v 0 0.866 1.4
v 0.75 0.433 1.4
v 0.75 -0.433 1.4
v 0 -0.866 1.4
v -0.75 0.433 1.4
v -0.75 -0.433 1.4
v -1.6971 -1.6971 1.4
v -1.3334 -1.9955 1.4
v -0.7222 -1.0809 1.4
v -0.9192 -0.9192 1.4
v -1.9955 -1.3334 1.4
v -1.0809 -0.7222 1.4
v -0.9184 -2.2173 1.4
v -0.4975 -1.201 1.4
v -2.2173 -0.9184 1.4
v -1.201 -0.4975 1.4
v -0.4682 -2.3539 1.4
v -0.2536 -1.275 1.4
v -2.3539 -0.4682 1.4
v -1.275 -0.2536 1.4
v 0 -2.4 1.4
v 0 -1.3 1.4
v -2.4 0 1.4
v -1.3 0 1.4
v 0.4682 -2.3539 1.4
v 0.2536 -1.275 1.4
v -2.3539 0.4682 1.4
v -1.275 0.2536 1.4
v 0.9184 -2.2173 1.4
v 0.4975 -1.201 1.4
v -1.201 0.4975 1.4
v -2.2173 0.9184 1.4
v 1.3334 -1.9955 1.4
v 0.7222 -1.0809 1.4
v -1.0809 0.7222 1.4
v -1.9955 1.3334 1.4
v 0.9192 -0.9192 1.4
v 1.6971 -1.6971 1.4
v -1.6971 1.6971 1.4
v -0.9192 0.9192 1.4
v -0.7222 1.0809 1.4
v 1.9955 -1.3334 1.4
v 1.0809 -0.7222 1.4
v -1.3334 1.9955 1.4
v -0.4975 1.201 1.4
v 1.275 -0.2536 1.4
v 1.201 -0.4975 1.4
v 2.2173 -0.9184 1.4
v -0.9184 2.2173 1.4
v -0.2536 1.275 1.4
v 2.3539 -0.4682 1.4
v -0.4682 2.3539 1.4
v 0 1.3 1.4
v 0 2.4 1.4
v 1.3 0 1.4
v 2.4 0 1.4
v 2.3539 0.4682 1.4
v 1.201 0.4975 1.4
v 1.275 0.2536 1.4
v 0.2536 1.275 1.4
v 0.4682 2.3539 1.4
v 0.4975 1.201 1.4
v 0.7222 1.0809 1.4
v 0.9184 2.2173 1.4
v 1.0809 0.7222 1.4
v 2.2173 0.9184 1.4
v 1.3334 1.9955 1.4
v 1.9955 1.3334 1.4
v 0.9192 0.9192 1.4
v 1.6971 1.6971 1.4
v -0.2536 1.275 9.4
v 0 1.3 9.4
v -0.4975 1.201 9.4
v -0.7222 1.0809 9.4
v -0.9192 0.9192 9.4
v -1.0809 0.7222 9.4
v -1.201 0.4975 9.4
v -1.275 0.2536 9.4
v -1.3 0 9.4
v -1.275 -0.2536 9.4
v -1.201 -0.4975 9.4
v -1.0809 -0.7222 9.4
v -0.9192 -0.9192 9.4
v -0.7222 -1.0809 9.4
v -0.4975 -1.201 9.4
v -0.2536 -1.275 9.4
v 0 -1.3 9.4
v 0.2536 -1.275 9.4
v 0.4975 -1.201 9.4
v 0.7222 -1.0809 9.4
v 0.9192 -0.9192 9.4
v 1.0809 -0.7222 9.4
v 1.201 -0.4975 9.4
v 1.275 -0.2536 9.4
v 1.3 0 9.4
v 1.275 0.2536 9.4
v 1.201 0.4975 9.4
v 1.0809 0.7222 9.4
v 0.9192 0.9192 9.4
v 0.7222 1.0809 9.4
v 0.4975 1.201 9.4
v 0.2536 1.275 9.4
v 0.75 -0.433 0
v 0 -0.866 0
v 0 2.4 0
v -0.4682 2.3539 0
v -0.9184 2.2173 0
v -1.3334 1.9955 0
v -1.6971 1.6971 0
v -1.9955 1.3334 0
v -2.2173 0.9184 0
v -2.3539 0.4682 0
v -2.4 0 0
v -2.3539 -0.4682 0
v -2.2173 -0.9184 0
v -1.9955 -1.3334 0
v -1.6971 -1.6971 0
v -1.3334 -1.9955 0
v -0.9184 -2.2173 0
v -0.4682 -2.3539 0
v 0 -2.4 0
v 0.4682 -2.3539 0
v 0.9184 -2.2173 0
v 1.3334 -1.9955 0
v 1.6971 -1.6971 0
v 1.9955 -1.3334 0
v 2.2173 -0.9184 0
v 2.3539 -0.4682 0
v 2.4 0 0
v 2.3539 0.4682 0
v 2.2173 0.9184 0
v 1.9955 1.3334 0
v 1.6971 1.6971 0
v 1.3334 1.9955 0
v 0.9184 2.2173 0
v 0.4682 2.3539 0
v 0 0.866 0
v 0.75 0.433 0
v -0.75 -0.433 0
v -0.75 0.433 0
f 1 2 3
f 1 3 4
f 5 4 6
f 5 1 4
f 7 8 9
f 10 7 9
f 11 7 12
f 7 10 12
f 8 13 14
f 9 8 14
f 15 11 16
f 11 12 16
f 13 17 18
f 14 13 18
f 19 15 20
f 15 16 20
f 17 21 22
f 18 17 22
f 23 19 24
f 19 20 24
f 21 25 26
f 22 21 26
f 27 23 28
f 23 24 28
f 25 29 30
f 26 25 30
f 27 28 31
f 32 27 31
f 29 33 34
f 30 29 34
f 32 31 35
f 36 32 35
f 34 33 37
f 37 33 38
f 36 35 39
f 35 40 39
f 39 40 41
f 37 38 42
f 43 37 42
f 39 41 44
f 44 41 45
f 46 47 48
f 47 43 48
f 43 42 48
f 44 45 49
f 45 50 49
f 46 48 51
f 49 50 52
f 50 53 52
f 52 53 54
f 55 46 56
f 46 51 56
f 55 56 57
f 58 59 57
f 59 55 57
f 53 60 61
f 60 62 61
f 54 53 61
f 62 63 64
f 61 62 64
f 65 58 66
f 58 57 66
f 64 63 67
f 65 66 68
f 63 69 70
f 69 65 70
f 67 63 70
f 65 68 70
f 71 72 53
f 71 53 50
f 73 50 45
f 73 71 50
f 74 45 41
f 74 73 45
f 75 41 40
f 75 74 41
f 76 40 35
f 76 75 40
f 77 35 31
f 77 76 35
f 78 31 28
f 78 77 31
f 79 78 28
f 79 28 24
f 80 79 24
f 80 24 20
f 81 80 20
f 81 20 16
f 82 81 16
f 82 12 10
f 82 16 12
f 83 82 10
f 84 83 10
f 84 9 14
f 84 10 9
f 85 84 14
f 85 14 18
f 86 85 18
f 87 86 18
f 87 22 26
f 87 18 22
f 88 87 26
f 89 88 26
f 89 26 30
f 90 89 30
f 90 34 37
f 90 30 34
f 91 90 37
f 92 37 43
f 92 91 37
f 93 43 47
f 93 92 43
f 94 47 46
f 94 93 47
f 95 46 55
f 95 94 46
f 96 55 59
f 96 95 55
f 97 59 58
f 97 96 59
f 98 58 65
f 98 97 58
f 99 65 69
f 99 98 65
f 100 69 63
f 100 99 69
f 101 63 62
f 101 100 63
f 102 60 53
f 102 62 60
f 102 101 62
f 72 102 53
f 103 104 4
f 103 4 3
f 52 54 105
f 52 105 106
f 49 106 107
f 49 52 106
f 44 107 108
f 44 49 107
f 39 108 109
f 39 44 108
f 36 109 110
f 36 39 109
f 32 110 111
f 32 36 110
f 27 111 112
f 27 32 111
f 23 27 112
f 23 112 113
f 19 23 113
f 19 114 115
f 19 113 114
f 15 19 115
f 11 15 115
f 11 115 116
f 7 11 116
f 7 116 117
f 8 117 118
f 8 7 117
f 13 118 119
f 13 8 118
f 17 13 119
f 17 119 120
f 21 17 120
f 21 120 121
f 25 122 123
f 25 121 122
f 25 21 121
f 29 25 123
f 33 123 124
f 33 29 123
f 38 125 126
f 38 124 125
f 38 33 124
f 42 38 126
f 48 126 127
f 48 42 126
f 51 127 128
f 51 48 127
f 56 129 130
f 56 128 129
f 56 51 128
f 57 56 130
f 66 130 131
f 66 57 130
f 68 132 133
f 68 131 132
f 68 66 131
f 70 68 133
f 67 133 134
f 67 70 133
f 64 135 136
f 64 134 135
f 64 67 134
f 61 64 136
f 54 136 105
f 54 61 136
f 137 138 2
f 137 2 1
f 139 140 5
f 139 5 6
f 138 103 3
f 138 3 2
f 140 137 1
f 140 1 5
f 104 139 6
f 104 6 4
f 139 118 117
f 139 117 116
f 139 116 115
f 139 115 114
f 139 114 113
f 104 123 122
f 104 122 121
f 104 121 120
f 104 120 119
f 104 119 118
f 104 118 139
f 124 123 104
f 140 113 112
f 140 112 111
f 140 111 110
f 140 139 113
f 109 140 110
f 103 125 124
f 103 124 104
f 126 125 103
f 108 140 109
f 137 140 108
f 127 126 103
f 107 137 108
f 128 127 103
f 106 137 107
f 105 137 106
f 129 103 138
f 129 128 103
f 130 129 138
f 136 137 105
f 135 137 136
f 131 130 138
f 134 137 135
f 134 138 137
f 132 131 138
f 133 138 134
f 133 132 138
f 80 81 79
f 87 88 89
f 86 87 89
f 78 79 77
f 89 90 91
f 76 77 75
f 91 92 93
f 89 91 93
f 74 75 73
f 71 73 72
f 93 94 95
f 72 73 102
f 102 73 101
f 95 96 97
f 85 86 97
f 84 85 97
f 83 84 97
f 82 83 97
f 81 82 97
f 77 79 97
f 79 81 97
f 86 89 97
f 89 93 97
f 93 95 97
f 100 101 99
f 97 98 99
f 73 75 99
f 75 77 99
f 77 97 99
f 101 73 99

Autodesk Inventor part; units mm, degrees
ref_plane "YZ Plane" through (0, 0, 0) normal (1, 0, 0) x (0, 1, 0)
ref_plane "XZ Plane" through (0, 0, 0) normal (0, 1, 0) x (-1, 0, 0)
ref_plane "XY Plane" through (0, 0, 0) normal (0, 0, 1) x (1, 0, 0)
sketch "スケッチ1" plane through (0, 0, 0) normal (1, 0, 0) x (0, 1, 0)
  line L0 (0, 9.4) -> (0, 0)
  line L1 (0, 0) -> (2.4, 0)
  line L2 (2.4, 0) -> (2.4, 1.4)
  line L3 (2.4, 1.4) -> (1.3, 1.4)
  line L4 (1.3, 1.4) -> (1.3, 9.4)
  line L5 (1.3, 9.4) -> (0, 9.4)
  dimension "d1" = 1.3
  dimension "d2" = 1.4
  dimension "d3" = 2.4
  dimension "d10" = 8
revolve "回転1" add sketch "スケッチ1" angle 360 about axis through (0, 0, 9.4) along (0, 0, -1)
thread "ねじ1" size "M2.6x0.45" class "6g" standard "ANSI Metric M Profile" full length
sketch "スケッチ2" plane through (0, 0, 0) normal (0, 0, -1) x (-1, 0, 0)
  line L0 (0, 0.866) -> (0.75, 0.433)
  line L1 (0.75, 0.433) -> (0.75, -0.433)
  line L2 (0.75, -0.433) -> (0, -0.866)
  line L3 (0, -0.866) -> (-0.75, -0.433)
  line L4 (-0.75, -0.433) -> (-0.75, 0.433)
  line L5 (-0.75, 0.433) -> (0, 0.866)
  circle A0 centre (0, 0) radius 2.4 projected
  line L6 (0, 2.4) -> (0, -2.4) construction
  dimension "d7" = 1.5
extrude "押し出し1" cut sketch "スケッチ2" against normal blind 1.4 contours L0 L1 L2 L3 L4 L5
properties part number "M2_6-8" material "ステンレス鋼 AISI 304"
